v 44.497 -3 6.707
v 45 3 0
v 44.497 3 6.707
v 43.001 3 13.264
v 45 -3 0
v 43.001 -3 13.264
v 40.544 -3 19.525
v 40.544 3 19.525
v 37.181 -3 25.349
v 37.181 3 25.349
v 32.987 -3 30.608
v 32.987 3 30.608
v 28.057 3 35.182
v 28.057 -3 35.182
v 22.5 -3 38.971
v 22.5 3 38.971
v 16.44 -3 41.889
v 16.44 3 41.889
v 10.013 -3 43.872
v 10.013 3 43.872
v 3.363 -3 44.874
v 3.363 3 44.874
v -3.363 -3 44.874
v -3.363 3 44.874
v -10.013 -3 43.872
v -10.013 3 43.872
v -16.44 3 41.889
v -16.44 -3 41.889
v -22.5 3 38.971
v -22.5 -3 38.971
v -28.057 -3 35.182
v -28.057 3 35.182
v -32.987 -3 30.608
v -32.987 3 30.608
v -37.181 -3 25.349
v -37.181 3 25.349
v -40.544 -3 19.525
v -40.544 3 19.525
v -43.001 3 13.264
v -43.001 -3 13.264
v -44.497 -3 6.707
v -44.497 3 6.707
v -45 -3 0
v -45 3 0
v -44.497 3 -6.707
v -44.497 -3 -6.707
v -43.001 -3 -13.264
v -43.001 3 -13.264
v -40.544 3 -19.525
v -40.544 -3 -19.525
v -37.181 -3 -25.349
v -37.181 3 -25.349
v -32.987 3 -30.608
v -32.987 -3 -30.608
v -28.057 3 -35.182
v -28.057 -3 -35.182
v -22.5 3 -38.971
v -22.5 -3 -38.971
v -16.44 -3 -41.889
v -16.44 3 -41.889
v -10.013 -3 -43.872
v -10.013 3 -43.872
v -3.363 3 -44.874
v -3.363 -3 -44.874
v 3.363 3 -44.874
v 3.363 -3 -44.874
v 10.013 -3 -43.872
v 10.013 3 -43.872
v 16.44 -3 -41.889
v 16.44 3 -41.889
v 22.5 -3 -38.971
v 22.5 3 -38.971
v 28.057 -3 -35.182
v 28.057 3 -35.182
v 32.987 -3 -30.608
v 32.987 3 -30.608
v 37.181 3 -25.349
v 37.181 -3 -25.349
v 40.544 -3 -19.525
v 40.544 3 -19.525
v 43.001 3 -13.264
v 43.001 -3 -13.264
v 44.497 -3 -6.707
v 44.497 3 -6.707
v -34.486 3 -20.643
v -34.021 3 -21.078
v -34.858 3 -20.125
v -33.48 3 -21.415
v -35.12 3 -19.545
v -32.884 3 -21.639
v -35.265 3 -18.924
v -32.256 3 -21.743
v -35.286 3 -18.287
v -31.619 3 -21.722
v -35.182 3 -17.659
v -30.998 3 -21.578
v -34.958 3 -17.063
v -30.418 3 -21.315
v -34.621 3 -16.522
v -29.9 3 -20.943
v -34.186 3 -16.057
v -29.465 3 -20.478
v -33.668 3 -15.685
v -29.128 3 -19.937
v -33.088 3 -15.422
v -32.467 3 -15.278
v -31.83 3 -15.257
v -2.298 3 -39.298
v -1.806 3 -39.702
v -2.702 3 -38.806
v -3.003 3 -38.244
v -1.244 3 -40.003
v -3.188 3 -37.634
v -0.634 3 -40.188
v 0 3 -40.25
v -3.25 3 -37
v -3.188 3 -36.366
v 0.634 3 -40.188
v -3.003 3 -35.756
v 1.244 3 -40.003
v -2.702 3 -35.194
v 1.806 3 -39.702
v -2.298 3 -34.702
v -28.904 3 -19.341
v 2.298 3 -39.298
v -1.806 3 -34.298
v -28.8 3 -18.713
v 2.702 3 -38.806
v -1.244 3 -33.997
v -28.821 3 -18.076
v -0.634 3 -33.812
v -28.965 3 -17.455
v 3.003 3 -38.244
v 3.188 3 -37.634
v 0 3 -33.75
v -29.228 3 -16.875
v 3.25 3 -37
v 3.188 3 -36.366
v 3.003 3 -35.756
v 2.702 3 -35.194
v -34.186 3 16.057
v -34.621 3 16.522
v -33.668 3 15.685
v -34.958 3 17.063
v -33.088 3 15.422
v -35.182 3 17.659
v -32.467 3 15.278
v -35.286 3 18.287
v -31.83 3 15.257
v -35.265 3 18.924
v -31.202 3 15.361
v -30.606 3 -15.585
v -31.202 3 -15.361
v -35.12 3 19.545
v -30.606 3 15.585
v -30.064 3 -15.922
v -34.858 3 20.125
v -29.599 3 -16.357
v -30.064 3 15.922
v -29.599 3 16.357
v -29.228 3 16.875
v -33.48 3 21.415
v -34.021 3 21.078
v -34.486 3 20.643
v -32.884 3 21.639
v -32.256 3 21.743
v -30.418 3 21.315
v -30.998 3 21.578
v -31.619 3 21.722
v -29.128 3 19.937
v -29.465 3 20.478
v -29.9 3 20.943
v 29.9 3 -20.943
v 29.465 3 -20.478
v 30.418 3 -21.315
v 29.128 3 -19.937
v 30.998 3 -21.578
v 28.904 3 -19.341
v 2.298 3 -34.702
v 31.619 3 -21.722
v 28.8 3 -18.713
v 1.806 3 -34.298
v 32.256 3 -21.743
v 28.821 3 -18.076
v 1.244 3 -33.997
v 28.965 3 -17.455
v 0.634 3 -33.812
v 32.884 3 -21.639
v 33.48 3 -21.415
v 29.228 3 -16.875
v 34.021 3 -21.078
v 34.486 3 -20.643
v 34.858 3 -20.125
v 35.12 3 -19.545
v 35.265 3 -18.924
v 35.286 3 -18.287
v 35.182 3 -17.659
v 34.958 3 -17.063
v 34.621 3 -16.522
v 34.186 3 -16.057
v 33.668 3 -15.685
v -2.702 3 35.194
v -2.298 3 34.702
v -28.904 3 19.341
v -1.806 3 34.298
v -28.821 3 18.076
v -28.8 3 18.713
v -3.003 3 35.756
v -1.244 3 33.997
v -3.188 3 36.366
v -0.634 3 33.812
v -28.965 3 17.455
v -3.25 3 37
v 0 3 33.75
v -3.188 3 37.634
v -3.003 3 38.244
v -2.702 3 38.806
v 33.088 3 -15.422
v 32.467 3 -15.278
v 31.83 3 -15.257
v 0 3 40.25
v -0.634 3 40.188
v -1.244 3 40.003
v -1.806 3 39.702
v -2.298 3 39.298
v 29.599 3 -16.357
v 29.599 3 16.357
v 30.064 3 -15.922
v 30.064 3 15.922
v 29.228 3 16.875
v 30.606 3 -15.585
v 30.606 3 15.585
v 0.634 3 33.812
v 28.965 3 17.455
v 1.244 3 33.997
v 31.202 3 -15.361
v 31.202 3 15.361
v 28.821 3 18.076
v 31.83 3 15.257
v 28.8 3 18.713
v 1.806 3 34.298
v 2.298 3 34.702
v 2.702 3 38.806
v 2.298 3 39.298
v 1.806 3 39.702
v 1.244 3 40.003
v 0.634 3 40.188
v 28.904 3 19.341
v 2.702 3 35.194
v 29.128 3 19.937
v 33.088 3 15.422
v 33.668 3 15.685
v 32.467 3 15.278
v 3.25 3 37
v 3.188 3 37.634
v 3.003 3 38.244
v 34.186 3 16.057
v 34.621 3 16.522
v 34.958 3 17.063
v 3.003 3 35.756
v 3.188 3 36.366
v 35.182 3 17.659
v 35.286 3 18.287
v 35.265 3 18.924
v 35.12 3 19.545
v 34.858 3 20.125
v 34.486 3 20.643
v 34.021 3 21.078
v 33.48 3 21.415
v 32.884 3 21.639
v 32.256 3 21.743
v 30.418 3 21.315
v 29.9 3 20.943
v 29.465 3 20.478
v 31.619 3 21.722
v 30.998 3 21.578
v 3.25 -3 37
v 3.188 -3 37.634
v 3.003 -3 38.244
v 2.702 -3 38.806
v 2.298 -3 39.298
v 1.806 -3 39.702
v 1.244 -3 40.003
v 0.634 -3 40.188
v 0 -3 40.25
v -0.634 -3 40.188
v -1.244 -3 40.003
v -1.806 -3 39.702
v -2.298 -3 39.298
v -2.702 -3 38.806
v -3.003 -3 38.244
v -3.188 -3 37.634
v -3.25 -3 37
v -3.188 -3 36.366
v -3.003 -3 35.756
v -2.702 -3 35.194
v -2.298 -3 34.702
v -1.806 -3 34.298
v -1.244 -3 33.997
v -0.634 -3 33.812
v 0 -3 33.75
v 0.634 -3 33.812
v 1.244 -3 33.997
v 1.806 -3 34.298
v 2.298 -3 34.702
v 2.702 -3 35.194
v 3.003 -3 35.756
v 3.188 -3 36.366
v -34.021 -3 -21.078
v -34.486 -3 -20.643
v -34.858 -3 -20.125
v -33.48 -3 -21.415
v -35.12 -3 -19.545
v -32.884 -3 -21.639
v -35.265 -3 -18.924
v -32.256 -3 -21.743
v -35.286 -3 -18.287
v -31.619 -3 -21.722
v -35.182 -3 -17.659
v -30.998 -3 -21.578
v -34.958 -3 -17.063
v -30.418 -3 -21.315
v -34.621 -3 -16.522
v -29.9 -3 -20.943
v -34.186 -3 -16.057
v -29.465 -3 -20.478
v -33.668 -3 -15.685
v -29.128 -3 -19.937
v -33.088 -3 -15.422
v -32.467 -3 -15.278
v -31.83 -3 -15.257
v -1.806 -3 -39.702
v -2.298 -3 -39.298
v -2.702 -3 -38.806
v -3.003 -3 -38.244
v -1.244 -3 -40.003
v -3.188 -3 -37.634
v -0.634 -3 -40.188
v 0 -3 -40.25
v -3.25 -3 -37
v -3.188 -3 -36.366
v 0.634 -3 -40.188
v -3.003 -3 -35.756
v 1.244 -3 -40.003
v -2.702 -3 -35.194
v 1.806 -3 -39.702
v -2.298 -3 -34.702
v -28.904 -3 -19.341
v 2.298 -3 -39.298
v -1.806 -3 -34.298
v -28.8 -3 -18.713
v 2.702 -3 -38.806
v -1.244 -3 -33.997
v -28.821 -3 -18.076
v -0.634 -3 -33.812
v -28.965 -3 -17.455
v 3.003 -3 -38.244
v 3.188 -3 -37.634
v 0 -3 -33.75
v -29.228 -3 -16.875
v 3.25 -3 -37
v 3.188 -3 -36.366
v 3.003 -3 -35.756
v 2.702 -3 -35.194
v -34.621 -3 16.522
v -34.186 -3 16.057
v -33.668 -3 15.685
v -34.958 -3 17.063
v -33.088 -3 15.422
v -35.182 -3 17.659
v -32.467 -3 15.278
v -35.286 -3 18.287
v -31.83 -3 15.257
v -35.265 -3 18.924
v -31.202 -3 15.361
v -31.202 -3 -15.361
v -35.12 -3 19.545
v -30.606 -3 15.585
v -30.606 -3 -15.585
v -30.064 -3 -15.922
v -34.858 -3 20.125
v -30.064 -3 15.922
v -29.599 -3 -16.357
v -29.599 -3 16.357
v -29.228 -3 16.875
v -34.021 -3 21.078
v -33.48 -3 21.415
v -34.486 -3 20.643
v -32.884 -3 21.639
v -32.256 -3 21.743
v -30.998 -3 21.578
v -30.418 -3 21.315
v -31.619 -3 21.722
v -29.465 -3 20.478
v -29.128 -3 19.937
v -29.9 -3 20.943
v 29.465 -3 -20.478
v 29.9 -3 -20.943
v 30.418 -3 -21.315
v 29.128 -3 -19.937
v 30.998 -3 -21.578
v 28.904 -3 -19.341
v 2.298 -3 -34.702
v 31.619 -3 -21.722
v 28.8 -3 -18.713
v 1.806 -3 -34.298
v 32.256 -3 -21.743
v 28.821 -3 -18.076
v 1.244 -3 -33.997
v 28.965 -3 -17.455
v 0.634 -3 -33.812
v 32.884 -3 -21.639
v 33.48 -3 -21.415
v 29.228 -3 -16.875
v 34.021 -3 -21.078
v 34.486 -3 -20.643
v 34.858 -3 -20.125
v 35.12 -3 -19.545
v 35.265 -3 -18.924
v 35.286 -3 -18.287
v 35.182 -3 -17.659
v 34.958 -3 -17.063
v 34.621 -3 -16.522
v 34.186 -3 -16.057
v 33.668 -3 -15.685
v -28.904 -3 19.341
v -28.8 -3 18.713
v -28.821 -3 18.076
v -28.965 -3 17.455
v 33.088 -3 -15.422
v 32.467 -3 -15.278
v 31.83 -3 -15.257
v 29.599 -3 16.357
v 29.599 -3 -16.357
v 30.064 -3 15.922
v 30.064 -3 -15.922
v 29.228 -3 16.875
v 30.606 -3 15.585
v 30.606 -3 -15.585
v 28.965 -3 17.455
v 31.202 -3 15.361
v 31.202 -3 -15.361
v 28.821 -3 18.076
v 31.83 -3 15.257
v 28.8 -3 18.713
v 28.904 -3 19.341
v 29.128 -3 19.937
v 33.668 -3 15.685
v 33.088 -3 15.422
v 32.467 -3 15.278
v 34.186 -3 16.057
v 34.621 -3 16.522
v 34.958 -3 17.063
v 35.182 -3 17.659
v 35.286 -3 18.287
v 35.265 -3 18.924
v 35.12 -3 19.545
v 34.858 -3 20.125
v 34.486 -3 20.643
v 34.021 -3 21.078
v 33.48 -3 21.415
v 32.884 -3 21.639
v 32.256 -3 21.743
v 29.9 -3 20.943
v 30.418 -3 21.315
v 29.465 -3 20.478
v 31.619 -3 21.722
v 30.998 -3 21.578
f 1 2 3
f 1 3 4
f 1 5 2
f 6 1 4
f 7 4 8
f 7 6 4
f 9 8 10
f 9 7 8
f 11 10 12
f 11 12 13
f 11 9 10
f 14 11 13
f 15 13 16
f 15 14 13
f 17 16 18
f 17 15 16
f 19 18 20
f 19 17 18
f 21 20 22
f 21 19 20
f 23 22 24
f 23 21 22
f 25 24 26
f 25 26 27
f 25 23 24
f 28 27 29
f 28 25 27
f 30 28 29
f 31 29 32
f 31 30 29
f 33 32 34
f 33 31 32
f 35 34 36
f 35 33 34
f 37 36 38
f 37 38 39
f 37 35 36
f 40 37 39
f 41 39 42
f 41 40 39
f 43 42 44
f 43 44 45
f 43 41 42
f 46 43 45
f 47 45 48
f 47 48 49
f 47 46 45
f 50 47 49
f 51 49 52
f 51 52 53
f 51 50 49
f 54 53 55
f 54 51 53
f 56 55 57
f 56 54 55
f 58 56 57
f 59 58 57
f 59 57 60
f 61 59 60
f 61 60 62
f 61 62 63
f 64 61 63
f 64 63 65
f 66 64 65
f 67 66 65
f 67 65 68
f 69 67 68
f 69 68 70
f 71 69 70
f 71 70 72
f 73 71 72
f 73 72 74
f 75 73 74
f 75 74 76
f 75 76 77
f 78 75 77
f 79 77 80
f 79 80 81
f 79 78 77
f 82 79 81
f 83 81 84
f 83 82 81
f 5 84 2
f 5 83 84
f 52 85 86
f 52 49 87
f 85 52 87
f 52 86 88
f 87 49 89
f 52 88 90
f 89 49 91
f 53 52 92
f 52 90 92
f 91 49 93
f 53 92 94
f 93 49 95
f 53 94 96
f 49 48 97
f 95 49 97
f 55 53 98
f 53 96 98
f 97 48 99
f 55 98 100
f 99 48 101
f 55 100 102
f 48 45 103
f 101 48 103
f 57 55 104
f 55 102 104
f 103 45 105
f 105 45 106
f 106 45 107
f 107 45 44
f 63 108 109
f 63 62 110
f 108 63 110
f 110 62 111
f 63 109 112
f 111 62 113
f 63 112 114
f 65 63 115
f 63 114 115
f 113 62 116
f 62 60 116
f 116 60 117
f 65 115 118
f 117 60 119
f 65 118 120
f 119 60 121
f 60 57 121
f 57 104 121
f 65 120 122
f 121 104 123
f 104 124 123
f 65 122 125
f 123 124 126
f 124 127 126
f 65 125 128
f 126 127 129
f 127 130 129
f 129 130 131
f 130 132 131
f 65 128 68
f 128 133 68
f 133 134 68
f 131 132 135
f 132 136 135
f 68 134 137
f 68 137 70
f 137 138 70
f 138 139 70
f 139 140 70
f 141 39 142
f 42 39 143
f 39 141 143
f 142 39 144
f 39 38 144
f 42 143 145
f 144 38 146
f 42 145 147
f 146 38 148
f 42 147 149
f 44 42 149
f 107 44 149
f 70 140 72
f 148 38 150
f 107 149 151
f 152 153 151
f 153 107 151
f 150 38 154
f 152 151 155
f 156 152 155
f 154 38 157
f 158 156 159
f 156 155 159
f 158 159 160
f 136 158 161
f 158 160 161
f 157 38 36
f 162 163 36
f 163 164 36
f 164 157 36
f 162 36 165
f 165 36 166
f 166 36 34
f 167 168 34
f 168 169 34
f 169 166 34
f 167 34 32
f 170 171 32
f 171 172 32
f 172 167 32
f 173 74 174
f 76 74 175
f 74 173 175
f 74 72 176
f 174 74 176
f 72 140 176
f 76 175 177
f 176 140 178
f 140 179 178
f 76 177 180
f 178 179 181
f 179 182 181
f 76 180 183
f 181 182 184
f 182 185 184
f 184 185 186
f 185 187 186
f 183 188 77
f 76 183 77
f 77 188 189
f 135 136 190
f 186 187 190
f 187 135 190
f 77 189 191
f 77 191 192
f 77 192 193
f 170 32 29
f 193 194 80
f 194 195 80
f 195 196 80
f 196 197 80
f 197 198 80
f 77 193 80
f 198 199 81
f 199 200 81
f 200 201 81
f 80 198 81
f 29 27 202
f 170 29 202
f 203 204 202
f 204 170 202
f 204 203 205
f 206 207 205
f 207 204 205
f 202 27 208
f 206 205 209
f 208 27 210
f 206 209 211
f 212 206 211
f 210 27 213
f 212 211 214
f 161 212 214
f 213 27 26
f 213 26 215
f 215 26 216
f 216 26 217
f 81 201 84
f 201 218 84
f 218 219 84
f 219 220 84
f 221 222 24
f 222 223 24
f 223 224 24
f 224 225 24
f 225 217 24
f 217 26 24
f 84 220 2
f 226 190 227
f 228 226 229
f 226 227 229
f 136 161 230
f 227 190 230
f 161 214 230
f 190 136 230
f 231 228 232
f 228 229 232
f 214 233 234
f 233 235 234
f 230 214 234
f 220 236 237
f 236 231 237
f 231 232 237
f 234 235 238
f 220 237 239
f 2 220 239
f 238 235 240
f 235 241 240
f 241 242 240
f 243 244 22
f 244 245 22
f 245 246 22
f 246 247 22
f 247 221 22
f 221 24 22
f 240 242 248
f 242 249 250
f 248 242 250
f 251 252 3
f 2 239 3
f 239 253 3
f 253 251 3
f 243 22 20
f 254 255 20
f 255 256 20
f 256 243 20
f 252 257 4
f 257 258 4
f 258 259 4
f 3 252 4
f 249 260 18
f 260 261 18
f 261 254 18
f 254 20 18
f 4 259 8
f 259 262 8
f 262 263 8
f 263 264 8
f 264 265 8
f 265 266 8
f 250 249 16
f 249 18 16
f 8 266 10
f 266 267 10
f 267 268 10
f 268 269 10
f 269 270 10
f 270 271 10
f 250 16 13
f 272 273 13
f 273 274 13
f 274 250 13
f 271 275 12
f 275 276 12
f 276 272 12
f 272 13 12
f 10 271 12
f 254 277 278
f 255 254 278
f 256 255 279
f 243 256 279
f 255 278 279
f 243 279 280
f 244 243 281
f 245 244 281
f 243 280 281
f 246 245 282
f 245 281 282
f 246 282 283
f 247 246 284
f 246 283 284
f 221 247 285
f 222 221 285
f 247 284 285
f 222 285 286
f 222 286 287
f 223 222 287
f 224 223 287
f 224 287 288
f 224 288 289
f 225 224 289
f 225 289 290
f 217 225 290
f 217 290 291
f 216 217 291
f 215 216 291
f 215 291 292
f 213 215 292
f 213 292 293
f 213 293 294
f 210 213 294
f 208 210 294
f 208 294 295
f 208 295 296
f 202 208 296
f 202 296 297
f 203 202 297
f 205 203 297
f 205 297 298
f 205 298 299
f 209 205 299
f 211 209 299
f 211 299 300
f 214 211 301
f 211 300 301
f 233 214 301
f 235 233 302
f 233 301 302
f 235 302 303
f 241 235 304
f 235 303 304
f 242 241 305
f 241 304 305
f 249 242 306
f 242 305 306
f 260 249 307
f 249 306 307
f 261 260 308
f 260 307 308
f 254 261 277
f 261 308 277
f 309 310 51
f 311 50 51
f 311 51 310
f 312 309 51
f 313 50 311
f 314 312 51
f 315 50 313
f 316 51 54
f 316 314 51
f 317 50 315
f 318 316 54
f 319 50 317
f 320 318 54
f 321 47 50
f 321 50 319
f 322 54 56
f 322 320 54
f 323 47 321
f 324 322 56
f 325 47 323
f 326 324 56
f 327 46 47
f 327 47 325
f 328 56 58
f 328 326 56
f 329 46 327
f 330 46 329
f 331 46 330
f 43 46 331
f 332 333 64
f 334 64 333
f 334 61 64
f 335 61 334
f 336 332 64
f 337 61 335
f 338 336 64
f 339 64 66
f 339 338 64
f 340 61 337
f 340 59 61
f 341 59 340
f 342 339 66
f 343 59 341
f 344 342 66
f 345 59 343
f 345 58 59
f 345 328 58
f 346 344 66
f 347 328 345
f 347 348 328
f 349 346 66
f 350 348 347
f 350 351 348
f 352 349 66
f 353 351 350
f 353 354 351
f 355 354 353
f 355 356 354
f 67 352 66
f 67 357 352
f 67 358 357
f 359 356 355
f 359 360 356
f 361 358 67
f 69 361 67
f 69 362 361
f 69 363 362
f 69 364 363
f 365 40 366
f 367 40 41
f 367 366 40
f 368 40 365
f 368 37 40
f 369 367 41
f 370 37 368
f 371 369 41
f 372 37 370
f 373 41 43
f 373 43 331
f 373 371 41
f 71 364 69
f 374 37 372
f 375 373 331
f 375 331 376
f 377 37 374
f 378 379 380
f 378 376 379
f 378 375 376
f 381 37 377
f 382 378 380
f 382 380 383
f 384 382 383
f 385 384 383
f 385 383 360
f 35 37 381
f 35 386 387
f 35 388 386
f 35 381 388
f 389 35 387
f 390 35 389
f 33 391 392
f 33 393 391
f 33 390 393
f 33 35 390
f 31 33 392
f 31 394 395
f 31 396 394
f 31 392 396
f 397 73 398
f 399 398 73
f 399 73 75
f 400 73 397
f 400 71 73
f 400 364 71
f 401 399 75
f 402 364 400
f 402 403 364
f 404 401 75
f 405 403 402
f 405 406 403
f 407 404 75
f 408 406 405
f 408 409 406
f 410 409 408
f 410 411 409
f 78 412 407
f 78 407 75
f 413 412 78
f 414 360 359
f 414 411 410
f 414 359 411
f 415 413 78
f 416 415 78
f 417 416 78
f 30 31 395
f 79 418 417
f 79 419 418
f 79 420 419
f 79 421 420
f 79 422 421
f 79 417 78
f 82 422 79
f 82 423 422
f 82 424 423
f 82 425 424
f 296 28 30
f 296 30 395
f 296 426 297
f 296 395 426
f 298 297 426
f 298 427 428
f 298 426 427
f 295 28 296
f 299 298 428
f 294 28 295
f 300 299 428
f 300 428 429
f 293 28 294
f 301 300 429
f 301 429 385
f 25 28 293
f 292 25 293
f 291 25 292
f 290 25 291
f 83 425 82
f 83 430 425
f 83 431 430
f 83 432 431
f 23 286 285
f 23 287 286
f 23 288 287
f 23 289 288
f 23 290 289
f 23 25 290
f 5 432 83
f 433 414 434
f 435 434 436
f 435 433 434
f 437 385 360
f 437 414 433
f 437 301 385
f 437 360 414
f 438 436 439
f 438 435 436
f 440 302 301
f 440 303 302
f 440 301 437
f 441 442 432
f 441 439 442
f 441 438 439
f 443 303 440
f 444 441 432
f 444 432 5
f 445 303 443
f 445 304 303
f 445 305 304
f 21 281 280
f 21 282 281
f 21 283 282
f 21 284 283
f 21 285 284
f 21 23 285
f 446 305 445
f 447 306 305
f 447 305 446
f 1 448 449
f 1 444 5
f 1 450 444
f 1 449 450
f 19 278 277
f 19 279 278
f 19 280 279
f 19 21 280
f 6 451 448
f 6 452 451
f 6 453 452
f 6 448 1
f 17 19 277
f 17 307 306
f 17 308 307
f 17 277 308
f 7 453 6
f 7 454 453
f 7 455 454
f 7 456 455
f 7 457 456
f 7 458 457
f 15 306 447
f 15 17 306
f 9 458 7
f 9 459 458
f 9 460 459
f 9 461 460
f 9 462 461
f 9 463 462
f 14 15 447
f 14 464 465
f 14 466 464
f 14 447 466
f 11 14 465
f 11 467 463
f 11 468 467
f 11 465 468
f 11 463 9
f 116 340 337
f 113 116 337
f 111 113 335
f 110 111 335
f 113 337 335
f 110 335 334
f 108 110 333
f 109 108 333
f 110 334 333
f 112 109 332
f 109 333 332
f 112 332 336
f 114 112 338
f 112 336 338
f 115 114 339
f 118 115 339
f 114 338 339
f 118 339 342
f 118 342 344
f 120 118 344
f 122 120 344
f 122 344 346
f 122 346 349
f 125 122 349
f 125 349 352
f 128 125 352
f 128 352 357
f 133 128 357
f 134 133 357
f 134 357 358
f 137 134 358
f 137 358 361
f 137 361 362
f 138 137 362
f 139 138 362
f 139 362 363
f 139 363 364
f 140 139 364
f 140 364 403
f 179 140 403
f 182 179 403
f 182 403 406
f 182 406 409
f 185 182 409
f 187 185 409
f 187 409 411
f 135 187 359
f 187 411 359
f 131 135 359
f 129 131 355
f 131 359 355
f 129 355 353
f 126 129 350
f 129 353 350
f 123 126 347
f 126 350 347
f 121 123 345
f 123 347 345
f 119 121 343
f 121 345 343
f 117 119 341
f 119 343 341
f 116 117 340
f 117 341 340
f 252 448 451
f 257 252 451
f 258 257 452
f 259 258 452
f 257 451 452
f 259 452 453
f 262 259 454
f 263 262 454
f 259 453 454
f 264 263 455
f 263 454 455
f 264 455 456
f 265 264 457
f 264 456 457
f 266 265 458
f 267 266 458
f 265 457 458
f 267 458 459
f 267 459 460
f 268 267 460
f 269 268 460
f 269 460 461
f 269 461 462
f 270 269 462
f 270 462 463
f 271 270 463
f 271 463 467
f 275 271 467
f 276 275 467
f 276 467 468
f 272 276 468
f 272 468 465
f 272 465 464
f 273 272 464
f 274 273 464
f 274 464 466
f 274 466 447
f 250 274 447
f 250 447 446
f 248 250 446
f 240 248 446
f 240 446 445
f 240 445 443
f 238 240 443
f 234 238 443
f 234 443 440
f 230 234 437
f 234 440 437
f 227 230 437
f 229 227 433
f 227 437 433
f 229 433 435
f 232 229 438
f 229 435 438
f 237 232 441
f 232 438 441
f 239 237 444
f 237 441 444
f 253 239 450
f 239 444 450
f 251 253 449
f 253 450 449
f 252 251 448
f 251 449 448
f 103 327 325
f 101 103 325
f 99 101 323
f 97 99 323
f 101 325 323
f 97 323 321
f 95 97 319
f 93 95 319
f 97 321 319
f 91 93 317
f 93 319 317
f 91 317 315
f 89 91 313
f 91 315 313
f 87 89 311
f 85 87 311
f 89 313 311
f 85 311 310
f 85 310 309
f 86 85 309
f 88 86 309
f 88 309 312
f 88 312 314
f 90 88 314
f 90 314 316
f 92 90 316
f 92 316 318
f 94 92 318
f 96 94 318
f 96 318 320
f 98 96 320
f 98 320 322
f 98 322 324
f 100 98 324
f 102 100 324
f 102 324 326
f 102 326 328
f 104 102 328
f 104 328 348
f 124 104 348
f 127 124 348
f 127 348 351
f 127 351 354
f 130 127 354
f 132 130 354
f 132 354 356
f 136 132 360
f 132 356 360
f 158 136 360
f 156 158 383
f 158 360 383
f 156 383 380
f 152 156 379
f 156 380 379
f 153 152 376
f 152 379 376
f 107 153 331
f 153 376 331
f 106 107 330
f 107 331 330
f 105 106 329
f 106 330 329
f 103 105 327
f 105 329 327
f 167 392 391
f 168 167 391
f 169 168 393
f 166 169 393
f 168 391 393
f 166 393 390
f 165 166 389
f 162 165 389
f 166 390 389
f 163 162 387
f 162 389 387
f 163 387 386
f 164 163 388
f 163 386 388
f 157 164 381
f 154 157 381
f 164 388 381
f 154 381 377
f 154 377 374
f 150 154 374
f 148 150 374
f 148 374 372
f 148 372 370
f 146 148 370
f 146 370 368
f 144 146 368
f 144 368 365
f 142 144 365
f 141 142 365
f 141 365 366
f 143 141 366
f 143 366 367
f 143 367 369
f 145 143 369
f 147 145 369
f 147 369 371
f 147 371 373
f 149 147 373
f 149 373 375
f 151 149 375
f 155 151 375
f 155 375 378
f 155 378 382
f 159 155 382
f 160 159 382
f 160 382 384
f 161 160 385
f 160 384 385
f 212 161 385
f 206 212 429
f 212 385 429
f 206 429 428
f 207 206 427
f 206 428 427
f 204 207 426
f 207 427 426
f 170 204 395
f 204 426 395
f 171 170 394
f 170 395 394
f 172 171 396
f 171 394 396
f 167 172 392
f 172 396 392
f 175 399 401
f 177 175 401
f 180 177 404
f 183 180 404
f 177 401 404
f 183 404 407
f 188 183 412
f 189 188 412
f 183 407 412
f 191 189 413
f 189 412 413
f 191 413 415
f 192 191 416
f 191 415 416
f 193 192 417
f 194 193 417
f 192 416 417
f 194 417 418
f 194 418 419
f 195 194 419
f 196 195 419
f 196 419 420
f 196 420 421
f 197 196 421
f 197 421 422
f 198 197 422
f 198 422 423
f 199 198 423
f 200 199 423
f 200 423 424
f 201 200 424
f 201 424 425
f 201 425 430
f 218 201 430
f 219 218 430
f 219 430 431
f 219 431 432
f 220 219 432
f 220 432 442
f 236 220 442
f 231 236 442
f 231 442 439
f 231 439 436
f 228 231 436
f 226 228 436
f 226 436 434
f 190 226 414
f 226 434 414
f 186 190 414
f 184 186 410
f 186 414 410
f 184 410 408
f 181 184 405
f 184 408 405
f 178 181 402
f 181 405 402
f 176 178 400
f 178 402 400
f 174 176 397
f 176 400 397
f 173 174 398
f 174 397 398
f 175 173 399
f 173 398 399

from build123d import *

# Parameters (mm, degrees)
F0_R            = 45
F1_DEPTH        = 3
F2_R            = 3.25
F3_DEPTH        = 25
F3_COPIES_COUNT = 6


# Not quite as in the source:
# - a pattern or mirror of a feature is missing from the dataset's text; its kind, count and spacing are read off the source's solid


with BuildPart() as f1:
    # F0 (on Front) → F1 (new body, symmetric)
    with BuildSketch(Plane.XZ):
        Circle(F0_R)
    extrude(amount=F1_DEPTH, both=True)

    # F2 (on face) → F3 (cut)
    with BuildSketch(Plane.XZ.offset(3)):
        with Locations((0, 37)):
            Circle(F2_R)
    f3 = extrude(amount=-F3_DEPTH, mode=Mode.SUBTRACT)

    # F3_copies: F3 ×6 about axis
    f3_copies_axis = Axis((0, 0, 0), (0, 1, 0))
    for i in range(1, F3_COPIES_COUNT):
        add(f3.rotate(f3_copies_axis, i * 360 / F3_COPIES_COUNT), mode=Mode.SUBTRACT)


solid = f1.part
